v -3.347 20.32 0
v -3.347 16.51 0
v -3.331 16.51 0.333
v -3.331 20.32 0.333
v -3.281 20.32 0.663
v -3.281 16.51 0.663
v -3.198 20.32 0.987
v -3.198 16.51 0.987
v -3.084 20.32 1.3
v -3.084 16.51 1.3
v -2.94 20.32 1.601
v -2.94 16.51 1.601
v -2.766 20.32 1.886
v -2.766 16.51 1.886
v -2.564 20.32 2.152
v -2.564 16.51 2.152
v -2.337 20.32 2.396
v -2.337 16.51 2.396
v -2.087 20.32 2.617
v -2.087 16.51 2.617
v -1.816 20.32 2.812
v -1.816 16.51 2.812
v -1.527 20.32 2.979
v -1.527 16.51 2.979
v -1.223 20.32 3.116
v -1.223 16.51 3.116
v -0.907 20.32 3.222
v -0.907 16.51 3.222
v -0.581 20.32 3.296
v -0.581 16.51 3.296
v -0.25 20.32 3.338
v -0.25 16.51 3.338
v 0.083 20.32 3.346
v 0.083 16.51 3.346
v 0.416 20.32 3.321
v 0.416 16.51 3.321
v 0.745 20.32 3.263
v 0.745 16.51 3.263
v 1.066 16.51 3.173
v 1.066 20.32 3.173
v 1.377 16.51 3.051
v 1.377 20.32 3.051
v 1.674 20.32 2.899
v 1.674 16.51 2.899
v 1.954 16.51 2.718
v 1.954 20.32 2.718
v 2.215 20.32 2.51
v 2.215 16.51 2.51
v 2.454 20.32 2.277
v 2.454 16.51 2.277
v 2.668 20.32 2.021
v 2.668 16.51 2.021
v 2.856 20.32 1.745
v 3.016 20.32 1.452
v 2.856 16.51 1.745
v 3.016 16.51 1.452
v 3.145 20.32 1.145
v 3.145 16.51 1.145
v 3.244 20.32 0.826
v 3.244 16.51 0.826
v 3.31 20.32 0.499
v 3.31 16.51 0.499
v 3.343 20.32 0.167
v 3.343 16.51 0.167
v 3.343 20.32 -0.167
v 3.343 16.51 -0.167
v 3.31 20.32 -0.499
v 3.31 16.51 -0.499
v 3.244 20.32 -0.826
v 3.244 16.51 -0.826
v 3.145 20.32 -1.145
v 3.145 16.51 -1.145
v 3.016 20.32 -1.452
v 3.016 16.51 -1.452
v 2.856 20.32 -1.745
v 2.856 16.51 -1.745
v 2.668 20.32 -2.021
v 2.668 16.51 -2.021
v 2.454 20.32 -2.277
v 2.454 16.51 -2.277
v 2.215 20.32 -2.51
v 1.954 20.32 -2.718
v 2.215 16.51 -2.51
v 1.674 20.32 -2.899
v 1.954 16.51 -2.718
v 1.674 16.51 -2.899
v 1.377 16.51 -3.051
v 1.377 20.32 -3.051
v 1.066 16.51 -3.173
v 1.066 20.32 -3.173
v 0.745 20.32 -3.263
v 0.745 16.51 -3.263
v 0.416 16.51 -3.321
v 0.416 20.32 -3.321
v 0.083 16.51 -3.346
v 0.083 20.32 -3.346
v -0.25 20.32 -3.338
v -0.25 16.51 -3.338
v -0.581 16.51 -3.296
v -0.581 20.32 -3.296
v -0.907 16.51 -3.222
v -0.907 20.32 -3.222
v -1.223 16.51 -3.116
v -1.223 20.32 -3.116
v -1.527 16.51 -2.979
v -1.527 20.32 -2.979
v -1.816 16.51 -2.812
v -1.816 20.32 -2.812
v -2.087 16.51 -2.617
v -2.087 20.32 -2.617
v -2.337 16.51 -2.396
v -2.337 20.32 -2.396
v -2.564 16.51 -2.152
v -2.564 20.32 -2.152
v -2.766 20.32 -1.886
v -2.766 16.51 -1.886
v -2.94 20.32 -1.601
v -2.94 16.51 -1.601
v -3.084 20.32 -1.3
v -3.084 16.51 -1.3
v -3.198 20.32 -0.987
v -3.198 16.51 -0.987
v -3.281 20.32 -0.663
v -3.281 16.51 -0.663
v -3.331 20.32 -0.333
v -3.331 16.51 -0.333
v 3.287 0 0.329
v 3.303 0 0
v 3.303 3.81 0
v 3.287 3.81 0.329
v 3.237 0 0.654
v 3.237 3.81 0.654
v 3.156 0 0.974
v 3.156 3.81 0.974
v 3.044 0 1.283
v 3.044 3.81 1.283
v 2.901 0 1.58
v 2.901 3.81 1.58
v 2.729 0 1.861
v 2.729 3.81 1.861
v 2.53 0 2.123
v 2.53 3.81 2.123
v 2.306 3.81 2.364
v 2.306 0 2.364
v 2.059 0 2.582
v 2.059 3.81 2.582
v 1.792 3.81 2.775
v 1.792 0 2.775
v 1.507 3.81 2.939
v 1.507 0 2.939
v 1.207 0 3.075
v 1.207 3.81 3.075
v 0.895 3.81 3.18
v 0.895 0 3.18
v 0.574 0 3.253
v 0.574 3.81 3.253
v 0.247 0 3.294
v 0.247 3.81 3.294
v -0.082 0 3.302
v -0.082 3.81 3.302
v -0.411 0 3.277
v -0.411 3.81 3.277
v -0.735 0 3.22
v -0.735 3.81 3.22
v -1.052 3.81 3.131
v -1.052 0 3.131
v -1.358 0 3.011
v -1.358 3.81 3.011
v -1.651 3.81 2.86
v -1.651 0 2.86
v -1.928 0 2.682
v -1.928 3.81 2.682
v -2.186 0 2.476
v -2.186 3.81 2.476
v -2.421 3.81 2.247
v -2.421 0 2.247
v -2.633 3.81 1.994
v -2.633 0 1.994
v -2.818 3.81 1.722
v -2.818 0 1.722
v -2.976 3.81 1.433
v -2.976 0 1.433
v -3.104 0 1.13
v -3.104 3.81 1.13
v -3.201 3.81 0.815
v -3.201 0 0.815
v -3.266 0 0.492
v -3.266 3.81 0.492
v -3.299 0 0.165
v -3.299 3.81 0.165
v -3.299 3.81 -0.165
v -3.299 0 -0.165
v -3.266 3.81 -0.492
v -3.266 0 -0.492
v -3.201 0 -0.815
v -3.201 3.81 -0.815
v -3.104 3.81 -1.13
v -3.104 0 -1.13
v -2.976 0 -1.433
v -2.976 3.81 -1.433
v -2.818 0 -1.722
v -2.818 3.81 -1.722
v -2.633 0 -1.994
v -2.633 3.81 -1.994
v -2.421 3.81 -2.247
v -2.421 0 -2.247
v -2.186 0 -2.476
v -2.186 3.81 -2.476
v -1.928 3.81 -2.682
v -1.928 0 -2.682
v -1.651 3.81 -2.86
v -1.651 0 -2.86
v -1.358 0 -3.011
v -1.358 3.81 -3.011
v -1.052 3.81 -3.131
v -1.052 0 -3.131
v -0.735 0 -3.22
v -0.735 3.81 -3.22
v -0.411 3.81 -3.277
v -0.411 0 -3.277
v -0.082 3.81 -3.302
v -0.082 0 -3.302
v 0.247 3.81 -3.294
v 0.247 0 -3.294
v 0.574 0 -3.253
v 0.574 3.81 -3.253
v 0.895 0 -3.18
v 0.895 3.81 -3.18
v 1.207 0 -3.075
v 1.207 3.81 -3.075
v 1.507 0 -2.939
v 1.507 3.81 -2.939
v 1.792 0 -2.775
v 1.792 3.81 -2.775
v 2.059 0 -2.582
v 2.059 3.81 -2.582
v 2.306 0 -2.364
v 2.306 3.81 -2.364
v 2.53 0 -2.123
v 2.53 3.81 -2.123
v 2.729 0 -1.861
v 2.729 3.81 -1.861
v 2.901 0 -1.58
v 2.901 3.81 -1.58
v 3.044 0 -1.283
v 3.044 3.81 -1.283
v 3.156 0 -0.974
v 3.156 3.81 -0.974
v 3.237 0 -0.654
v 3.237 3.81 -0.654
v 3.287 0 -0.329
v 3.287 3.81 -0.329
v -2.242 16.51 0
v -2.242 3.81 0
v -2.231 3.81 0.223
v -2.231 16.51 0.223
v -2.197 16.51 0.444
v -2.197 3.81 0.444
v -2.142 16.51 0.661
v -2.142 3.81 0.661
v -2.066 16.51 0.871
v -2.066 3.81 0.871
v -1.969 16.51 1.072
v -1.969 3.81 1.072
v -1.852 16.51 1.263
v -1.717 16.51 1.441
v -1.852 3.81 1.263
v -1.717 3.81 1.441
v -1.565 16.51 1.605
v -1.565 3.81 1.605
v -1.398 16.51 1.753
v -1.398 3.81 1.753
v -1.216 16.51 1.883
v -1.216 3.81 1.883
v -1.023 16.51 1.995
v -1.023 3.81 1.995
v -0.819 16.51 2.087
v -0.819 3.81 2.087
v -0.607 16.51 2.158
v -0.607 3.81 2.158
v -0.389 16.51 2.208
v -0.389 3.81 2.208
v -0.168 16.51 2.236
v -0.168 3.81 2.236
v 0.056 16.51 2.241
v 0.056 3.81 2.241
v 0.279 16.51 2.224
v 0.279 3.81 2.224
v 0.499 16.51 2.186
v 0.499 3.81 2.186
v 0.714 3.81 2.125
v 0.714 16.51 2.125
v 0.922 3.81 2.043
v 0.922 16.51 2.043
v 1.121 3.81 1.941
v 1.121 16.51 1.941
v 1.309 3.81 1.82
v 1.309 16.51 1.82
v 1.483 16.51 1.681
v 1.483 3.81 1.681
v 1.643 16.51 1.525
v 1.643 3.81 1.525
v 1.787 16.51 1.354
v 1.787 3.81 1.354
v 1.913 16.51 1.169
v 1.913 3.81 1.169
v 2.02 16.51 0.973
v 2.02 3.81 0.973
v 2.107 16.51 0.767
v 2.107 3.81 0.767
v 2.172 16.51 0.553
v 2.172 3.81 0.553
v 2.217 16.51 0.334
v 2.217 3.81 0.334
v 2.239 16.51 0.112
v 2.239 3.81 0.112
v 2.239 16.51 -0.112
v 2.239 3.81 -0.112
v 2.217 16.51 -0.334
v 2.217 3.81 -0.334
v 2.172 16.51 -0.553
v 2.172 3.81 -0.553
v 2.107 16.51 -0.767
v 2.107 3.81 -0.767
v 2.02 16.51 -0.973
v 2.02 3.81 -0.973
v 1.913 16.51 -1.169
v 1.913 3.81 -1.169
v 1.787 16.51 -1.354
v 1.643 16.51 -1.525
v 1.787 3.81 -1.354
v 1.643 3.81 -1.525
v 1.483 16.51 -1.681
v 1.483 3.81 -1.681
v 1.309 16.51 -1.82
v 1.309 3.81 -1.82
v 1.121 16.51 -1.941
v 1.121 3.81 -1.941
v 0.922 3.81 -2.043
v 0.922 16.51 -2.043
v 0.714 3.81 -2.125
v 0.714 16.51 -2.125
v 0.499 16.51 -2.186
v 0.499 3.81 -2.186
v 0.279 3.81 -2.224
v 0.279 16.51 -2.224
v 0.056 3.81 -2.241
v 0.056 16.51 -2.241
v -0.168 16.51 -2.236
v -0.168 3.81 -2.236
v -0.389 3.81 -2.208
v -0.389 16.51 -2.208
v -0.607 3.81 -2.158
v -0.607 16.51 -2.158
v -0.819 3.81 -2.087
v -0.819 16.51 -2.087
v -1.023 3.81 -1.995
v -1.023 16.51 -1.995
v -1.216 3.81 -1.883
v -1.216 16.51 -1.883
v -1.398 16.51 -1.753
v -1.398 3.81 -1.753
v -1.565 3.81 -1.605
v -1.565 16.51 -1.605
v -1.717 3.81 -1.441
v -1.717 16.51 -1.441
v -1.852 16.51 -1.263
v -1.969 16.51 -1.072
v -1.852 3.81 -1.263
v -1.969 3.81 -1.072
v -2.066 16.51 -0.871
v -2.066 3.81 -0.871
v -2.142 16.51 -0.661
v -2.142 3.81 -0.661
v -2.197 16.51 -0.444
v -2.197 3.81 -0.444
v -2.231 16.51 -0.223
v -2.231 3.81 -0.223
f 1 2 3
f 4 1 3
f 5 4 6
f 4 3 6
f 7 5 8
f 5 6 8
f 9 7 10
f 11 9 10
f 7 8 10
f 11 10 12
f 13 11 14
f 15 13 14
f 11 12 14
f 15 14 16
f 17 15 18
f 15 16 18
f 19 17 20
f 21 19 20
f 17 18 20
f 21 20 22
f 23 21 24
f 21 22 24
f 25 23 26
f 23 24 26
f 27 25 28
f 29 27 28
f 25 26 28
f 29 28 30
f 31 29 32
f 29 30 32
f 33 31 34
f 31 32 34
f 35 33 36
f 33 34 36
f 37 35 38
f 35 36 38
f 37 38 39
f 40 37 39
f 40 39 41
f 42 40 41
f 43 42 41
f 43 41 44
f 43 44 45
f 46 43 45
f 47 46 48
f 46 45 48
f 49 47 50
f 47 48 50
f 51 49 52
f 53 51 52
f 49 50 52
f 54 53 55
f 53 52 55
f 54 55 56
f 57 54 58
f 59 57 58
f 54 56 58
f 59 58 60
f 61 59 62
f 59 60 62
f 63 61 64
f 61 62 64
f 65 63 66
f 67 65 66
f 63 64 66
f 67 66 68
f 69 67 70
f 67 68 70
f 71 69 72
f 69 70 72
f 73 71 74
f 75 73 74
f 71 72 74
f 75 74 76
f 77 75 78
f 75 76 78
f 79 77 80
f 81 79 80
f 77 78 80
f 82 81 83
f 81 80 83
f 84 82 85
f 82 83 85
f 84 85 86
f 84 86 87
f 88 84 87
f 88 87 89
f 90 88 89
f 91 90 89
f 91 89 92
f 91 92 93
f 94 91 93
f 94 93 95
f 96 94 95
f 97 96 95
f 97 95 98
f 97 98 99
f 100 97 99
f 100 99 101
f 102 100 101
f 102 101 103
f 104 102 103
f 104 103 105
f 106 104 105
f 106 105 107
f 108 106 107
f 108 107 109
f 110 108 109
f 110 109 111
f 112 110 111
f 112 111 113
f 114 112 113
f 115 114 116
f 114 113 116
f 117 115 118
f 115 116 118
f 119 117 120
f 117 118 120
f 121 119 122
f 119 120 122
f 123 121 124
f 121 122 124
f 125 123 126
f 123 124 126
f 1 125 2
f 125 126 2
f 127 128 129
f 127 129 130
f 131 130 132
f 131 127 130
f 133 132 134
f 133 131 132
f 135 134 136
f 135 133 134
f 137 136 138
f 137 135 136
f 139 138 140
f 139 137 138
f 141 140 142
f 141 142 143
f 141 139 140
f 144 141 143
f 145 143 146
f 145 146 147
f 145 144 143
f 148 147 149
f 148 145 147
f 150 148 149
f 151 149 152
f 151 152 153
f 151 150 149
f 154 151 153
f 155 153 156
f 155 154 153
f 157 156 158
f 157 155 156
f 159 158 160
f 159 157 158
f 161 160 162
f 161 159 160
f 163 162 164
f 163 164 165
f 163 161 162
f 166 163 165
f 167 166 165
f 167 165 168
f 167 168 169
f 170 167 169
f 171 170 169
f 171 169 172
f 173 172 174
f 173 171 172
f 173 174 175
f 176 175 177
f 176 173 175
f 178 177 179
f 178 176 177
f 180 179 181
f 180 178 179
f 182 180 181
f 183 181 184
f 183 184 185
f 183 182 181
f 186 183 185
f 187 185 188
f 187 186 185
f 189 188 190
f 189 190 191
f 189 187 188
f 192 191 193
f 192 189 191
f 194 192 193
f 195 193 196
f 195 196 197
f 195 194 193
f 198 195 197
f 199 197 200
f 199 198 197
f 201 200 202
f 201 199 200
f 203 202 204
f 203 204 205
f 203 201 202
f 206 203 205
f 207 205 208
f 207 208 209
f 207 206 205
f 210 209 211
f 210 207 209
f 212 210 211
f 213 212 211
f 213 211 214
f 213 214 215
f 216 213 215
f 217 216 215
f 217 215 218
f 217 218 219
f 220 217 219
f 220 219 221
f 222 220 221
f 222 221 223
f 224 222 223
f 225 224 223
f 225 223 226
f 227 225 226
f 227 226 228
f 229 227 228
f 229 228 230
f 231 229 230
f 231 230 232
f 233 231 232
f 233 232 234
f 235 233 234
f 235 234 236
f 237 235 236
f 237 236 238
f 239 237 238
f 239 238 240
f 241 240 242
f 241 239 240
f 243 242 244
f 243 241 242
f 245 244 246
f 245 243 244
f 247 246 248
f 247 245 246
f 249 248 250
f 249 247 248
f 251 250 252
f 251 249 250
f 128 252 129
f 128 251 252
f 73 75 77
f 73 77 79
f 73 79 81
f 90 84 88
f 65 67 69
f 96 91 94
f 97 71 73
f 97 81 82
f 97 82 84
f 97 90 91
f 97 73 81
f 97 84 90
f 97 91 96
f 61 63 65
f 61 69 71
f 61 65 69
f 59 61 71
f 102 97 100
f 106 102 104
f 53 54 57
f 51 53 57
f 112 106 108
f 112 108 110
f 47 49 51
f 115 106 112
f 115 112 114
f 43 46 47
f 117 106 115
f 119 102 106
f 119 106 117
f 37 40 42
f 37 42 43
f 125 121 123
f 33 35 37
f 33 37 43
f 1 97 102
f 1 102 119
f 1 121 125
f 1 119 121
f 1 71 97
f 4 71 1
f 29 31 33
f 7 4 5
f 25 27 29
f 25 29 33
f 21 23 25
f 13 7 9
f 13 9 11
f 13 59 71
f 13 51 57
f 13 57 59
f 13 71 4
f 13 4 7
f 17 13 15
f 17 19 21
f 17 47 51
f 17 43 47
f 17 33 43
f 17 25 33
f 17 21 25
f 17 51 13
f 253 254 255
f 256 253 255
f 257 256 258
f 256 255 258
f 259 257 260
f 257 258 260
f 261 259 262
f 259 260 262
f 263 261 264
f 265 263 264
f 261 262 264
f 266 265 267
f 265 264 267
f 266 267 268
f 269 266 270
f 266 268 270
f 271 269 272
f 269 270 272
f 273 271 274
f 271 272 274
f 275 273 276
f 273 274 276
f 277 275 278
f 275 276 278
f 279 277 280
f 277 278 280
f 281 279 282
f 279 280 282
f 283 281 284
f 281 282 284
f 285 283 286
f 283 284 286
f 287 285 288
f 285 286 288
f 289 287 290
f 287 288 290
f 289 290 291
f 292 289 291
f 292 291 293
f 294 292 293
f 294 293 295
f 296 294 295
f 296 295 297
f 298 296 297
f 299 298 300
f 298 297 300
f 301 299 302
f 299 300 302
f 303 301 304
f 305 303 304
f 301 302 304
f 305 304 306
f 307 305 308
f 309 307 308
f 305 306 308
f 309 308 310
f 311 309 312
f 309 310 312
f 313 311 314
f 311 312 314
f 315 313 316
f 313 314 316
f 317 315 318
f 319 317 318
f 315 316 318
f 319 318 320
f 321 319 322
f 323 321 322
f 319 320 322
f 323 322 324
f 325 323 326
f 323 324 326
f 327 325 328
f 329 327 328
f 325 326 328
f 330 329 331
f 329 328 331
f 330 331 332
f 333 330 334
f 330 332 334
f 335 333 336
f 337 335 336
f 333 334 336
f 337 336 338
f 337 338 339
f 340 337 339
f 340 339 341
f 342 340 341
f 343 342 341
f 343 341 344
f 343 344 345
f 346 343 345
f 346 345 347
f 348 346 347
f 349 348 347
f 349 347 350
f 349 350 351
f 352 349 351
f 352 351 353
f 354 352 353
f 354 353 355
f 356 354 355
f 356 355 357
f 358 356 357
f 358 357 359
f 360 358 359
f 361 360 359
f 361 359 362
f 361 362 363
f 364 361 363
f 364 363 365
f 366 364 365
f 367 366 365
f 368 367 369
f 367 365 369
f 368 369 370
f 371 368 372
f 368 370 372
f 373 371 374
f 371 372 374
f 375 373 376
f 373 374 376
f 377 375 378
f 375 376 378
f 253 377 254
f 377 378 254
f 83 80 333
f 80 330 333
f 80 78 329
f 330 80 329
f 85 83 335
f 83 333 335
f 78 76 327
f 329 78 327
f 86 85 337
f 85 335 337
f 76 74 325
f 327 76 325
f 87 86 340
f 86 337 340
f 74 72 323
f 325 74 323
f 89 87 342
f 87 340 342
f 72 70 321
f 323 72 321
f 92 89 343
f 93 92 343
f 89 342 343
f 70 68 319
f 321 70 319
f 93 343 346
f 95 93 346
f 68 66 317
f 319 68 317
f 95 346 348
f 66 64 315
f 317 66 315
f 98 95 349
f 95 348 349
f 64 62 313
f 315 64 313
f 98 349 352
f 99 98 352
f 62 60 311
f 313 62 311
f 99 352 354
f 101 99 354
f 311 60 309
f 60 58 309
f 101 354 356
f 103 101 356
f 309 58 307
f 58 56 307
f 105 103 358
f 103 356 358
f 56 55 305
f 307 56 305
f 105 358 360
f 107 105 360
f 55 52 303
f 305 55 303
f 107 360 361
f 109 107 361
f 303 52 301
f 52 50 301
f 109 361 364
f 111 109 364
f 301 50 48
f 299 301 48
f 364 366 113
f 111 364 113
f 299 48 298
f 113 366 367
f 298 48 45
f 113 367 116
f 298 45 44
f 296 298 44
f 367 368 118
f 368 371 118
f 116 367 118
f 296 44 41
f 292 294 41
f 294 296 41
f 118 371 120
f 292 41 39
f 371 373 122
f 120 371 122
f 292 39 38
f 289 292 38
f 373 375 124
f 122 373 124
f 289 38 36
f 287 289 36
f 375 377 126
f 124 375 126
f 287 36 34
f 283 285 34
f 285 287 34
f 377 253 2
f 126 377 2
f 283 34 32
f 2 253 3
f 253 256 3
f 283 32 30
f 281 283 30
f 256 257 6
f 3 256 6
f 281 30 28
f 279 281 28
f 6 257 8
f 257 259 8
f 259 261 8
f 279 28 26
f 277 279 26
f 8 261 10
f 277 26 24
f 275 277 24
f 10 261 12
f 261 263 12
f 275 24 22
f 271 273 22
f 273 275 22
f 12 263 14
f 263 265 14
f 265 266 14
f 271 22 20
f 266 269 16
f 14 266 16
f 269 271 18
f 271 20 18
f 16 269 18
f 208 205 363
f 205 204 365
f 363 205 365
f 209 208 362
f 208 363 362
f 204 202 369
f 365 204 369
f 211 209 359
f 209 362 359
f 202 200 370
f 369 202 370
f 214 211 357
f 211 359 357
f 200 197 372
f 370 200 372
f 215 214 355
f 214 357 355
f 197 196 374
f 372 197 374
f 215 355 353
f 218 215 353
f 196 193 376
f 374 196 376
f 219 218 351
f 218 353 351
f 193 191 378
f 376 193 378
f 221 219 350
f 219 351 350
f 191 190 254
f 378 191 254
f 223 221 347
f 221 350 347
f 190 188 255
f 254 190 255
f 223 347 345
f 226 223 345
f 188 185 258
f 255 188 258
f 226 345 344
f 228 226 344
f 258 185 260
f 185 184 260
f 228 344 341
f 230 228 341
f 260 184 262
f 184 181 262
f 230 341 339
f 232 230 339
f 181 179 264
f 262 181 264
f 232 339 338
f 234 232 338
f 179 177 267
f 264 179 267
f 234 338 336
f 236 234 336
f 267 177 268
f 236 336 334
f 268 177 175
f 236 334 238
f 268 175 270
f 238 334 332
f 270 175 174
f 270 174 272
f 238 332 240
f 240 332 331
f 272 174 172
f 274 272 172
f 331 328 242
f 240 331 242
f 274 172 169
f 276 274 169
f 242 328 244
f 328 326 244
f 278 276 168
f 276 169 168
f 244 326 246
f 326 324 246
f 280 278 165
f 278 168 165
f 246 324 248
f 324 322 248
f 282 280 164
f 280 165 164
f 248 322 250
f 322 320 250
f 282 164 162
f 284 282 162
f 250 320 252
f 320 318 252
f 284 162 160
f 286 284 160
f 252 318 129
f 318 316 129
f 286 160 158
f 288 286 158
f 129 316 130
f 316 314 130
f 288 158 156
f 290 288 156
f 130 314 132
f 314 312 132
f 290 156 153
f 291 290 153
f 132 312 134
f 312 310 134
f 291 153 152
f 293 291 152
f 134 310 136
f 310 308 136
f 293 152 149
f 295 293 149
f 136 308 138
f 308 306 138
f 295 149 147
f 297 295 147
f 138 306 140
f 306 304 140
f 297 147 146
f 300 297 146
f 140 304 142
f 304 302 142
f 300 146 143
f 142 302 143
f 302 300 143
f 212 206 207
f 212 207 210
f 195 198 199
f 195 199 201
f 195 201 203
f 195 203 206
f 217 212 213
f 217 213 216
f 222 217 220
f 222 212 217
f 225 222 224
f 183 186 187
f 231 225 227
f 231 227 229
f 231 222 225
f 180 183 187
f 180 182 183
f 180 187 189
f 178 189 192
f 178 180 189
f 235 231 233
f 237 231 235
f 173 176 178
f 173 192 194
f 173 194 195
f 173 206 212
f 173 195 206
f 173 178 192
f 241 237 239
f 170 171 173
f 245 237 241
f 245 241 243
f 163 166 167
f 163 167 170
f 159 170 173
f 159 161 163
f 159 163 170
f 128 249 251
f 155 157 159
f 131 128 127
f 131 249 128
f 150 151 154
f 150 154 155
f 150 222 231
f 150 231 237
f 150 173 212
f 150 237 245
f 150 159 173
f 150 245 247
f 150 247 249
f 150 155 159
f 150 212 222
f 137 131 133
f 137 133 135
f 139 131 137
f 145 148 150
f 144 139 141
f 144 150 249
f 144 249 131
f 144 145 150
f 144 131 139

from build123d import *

# Parameters (mm, degrees)
F0_R     = 3.302961
F1_DEPTH = 3.81
F2_R     = 2.241818
F3_DEPTH = 12.7
F4_R     = 3.347199
F5_DEPTH = 3.81


with BuildPart() as f1:
    # F0 (on Front) → F1 (new body)
    with BuildSketch(Plane.XZ):
        Circle(F0_R)
    extrude(amount=-F1_DEPTH)

    # F2 (on face) → F3 (join)
    with BuildSketch(Plane(origin=(0, 3.81, 0), x_dir=(-1, 0, 0), z_dir=(0, 1, 0))):
        Circle(F2_R)
    extrude(amount=F3_DEPTH)

    # F4 (on face) → F5 (join)
    with BuildSketch(Plane(origin=(0, 16.51, 0), x_dir=(-1, 0, 0), z_dir=(0, 1, 0))):
        Circle(F4_R)
    extrude(amount=F5_DEPTH)


solid = f1.part
